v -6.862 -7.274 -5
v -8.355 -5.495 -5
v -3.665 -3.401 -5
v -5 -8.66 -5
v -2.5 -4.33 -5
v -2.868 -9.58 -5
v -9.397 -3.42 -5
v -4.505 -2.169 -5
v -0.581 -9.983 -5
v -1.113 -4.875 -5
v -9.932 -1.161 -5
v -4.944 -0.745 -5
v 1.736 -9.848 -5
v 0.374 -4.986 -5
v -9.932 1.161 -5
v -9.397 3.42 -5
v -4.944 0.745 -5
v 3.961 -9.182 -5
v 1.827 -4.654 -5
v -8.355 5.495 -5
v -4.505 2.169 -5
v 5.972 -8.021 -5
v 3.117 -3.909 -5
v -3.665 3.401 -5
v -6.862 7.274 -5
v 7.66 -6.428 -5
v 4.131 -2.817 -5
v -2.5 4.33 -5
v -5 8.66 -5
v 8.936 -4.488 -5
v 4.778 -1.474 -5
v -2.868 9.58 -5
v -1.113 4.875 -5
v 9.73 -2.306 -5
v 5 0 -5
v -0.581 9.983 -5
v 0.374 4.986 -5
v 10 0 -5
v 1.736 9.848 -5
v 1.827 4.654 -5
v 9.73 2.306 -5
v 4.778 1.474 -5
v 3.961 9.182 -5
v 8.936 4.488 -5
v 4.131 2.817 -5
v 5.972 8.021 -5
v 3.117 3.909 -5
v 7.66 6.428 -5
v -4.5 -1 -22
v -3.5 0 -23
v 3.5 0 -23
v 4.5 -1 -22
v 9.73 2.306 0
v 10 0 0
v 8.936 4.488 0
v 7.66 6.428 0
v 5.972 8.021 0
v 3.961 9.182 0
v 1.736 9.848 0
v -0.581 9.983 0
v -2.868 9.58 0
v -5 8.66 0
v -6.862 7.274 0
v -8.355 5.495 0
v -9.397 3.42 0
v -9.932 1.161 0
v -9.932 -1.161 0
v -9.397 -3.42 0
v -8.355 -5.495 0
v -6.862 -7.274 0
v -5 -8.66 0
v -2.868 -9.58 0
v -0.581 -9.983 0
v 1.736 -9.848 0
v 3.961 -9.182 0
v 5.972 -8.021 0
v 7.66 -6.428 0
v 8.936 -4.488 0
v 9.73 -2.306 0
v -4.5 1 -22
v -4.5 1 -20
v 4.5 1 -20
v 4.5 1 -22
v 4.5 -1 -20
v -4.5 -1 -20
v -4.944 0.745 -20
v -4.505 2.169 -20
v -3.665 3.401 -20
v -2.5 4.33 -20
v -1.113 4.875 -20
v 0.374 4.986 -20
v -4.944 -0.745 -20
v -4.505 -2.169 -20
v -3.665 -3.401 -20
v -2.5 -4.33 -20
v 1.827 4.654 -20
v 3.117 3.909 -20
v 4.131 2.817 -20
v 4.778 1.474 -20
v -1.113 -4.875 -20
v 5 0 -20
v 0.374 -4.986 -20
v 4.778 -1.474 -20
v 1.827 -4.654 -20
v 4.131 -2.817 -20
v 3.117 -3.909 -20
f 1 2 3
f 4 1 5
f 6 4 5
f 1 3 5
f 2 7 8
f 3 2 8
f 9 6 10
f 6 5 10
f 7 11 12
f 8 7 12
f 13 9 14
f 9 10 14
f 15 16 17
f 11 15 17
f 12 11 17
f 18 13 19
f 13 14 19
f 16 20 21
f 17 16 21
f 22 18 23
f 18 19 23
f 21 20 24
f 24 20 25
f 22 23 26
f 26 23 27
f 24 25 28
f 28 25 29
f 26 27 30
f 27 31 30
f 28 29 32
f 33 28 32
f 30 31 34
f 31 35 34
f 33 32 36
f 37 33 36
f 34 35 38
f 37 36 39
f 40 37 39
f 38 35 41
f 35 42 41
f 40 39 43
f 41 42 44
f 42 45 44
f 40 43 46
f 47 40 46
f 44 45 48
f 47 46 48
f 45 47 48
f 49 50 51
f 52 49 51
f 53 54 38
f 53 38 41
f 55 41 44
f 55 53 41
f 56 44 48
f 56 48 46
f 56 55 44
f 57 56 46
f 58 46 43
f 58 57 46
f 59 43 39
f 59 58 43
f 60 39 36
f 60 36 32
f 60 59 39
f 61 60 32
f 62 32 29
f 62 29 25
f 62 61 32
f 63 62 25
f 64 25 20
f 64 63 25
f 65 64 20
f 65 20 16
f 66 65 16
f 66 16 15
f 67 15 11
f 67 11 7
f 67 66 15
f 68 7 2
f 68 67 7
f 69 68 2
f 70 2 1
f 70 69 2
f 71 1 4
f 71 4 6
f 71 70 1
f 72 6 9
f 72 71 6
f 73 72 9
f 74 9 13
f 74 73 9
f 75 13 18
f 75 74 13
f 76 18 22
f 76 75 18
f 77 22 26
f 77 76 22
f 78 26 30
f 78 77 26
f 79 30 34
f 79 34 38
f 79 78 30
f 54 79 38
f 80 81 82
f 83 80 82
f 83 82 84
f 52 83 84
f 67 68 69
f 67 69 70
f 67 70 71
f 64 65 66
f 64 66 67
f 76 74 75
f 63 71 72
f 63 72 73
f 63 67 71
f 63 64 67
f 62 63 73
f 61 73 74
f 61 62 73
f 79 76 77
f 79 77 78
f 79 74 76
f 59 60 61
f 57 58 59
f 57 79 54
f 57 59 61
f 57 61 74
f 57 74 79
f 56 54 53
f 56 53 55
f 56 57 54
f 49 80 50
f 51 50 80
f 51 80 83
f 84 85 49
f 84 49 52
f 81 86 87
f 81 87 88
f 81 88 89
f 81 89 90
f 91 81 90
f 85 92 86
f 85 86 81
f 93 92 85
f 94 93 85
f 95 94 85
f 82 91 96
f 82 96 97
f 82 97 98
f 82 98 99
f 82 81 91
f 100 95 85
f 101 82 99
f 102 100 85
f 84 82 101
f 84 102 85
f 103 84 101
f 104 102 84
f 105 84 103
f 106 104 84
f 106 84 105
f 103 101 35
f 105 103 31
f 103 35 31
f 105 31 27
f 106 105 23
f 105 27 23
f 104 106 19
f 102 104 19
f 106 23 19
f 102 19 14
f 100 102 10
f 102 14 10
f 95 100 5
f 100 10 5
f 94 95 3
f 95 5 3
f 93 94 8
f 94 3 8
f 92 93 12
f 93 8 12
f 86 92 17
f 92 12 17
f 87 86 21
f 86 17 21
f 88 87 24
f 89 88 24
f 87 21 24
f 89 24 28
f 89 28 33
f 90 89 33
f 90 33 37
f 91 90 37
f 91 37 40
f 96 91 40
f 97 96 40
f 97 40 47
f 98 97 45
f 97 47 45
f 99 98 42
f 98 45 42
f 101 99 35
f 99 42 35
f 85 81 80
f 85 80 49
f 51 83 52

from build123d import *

# Parameters (mm, degrees)
F0_R     = 10
F1_DEPTH = 5
F2_R     = 5
F3_DEPTH = 15
F4_W     = 9
F4_H     = 2
F5_DEPTH = 3
F6_SIZE  = 0.99999


# Not quite as in the source:
# - a fillet or chamfer is up to 0.001 mm smaller than in the source, because OpenCascade refuses the exact size


with BuildPart() as f1:
    # F0 (on Top) → F1 (new body)
    with BuildSketch(Plane.XY):
        Circle(F0_R)
    extrude(amount=-F1_DEPTH)

    # F2 (on face) → F3 (join)
    with BuildSketch(Plane(origin=(0, 0, -5), x_dir=(1, 0, 0), z_dir=(0, 0, -1))):
        Circle(F2_R)
    extrude(amount=F3_DEPTH)

    # F4 (on face) → F5 (join)
    with BuildSketch(Plane(origin=(0, 0, -20), x_dir=(1, 0, 0), z_dir=(0, 0, -1))):
        Rectangle(F4_W, F4_H)
    extrude(amount=F5_DEPTH)

    # F6 (size 1 in the source; OpenCascade refuses exactly that, so slightly less here)
    f6_edges = [f1.edges().sort_by_distance(p)[0] for p in [
        (0, -1, -23),
        (-4.5, 0, -23),
        (0, 1, -23),
        (4.5, 0, -23),
    ]]
    chamfer(f6_edges, length=F6_SIZE)


solid = f1.part
